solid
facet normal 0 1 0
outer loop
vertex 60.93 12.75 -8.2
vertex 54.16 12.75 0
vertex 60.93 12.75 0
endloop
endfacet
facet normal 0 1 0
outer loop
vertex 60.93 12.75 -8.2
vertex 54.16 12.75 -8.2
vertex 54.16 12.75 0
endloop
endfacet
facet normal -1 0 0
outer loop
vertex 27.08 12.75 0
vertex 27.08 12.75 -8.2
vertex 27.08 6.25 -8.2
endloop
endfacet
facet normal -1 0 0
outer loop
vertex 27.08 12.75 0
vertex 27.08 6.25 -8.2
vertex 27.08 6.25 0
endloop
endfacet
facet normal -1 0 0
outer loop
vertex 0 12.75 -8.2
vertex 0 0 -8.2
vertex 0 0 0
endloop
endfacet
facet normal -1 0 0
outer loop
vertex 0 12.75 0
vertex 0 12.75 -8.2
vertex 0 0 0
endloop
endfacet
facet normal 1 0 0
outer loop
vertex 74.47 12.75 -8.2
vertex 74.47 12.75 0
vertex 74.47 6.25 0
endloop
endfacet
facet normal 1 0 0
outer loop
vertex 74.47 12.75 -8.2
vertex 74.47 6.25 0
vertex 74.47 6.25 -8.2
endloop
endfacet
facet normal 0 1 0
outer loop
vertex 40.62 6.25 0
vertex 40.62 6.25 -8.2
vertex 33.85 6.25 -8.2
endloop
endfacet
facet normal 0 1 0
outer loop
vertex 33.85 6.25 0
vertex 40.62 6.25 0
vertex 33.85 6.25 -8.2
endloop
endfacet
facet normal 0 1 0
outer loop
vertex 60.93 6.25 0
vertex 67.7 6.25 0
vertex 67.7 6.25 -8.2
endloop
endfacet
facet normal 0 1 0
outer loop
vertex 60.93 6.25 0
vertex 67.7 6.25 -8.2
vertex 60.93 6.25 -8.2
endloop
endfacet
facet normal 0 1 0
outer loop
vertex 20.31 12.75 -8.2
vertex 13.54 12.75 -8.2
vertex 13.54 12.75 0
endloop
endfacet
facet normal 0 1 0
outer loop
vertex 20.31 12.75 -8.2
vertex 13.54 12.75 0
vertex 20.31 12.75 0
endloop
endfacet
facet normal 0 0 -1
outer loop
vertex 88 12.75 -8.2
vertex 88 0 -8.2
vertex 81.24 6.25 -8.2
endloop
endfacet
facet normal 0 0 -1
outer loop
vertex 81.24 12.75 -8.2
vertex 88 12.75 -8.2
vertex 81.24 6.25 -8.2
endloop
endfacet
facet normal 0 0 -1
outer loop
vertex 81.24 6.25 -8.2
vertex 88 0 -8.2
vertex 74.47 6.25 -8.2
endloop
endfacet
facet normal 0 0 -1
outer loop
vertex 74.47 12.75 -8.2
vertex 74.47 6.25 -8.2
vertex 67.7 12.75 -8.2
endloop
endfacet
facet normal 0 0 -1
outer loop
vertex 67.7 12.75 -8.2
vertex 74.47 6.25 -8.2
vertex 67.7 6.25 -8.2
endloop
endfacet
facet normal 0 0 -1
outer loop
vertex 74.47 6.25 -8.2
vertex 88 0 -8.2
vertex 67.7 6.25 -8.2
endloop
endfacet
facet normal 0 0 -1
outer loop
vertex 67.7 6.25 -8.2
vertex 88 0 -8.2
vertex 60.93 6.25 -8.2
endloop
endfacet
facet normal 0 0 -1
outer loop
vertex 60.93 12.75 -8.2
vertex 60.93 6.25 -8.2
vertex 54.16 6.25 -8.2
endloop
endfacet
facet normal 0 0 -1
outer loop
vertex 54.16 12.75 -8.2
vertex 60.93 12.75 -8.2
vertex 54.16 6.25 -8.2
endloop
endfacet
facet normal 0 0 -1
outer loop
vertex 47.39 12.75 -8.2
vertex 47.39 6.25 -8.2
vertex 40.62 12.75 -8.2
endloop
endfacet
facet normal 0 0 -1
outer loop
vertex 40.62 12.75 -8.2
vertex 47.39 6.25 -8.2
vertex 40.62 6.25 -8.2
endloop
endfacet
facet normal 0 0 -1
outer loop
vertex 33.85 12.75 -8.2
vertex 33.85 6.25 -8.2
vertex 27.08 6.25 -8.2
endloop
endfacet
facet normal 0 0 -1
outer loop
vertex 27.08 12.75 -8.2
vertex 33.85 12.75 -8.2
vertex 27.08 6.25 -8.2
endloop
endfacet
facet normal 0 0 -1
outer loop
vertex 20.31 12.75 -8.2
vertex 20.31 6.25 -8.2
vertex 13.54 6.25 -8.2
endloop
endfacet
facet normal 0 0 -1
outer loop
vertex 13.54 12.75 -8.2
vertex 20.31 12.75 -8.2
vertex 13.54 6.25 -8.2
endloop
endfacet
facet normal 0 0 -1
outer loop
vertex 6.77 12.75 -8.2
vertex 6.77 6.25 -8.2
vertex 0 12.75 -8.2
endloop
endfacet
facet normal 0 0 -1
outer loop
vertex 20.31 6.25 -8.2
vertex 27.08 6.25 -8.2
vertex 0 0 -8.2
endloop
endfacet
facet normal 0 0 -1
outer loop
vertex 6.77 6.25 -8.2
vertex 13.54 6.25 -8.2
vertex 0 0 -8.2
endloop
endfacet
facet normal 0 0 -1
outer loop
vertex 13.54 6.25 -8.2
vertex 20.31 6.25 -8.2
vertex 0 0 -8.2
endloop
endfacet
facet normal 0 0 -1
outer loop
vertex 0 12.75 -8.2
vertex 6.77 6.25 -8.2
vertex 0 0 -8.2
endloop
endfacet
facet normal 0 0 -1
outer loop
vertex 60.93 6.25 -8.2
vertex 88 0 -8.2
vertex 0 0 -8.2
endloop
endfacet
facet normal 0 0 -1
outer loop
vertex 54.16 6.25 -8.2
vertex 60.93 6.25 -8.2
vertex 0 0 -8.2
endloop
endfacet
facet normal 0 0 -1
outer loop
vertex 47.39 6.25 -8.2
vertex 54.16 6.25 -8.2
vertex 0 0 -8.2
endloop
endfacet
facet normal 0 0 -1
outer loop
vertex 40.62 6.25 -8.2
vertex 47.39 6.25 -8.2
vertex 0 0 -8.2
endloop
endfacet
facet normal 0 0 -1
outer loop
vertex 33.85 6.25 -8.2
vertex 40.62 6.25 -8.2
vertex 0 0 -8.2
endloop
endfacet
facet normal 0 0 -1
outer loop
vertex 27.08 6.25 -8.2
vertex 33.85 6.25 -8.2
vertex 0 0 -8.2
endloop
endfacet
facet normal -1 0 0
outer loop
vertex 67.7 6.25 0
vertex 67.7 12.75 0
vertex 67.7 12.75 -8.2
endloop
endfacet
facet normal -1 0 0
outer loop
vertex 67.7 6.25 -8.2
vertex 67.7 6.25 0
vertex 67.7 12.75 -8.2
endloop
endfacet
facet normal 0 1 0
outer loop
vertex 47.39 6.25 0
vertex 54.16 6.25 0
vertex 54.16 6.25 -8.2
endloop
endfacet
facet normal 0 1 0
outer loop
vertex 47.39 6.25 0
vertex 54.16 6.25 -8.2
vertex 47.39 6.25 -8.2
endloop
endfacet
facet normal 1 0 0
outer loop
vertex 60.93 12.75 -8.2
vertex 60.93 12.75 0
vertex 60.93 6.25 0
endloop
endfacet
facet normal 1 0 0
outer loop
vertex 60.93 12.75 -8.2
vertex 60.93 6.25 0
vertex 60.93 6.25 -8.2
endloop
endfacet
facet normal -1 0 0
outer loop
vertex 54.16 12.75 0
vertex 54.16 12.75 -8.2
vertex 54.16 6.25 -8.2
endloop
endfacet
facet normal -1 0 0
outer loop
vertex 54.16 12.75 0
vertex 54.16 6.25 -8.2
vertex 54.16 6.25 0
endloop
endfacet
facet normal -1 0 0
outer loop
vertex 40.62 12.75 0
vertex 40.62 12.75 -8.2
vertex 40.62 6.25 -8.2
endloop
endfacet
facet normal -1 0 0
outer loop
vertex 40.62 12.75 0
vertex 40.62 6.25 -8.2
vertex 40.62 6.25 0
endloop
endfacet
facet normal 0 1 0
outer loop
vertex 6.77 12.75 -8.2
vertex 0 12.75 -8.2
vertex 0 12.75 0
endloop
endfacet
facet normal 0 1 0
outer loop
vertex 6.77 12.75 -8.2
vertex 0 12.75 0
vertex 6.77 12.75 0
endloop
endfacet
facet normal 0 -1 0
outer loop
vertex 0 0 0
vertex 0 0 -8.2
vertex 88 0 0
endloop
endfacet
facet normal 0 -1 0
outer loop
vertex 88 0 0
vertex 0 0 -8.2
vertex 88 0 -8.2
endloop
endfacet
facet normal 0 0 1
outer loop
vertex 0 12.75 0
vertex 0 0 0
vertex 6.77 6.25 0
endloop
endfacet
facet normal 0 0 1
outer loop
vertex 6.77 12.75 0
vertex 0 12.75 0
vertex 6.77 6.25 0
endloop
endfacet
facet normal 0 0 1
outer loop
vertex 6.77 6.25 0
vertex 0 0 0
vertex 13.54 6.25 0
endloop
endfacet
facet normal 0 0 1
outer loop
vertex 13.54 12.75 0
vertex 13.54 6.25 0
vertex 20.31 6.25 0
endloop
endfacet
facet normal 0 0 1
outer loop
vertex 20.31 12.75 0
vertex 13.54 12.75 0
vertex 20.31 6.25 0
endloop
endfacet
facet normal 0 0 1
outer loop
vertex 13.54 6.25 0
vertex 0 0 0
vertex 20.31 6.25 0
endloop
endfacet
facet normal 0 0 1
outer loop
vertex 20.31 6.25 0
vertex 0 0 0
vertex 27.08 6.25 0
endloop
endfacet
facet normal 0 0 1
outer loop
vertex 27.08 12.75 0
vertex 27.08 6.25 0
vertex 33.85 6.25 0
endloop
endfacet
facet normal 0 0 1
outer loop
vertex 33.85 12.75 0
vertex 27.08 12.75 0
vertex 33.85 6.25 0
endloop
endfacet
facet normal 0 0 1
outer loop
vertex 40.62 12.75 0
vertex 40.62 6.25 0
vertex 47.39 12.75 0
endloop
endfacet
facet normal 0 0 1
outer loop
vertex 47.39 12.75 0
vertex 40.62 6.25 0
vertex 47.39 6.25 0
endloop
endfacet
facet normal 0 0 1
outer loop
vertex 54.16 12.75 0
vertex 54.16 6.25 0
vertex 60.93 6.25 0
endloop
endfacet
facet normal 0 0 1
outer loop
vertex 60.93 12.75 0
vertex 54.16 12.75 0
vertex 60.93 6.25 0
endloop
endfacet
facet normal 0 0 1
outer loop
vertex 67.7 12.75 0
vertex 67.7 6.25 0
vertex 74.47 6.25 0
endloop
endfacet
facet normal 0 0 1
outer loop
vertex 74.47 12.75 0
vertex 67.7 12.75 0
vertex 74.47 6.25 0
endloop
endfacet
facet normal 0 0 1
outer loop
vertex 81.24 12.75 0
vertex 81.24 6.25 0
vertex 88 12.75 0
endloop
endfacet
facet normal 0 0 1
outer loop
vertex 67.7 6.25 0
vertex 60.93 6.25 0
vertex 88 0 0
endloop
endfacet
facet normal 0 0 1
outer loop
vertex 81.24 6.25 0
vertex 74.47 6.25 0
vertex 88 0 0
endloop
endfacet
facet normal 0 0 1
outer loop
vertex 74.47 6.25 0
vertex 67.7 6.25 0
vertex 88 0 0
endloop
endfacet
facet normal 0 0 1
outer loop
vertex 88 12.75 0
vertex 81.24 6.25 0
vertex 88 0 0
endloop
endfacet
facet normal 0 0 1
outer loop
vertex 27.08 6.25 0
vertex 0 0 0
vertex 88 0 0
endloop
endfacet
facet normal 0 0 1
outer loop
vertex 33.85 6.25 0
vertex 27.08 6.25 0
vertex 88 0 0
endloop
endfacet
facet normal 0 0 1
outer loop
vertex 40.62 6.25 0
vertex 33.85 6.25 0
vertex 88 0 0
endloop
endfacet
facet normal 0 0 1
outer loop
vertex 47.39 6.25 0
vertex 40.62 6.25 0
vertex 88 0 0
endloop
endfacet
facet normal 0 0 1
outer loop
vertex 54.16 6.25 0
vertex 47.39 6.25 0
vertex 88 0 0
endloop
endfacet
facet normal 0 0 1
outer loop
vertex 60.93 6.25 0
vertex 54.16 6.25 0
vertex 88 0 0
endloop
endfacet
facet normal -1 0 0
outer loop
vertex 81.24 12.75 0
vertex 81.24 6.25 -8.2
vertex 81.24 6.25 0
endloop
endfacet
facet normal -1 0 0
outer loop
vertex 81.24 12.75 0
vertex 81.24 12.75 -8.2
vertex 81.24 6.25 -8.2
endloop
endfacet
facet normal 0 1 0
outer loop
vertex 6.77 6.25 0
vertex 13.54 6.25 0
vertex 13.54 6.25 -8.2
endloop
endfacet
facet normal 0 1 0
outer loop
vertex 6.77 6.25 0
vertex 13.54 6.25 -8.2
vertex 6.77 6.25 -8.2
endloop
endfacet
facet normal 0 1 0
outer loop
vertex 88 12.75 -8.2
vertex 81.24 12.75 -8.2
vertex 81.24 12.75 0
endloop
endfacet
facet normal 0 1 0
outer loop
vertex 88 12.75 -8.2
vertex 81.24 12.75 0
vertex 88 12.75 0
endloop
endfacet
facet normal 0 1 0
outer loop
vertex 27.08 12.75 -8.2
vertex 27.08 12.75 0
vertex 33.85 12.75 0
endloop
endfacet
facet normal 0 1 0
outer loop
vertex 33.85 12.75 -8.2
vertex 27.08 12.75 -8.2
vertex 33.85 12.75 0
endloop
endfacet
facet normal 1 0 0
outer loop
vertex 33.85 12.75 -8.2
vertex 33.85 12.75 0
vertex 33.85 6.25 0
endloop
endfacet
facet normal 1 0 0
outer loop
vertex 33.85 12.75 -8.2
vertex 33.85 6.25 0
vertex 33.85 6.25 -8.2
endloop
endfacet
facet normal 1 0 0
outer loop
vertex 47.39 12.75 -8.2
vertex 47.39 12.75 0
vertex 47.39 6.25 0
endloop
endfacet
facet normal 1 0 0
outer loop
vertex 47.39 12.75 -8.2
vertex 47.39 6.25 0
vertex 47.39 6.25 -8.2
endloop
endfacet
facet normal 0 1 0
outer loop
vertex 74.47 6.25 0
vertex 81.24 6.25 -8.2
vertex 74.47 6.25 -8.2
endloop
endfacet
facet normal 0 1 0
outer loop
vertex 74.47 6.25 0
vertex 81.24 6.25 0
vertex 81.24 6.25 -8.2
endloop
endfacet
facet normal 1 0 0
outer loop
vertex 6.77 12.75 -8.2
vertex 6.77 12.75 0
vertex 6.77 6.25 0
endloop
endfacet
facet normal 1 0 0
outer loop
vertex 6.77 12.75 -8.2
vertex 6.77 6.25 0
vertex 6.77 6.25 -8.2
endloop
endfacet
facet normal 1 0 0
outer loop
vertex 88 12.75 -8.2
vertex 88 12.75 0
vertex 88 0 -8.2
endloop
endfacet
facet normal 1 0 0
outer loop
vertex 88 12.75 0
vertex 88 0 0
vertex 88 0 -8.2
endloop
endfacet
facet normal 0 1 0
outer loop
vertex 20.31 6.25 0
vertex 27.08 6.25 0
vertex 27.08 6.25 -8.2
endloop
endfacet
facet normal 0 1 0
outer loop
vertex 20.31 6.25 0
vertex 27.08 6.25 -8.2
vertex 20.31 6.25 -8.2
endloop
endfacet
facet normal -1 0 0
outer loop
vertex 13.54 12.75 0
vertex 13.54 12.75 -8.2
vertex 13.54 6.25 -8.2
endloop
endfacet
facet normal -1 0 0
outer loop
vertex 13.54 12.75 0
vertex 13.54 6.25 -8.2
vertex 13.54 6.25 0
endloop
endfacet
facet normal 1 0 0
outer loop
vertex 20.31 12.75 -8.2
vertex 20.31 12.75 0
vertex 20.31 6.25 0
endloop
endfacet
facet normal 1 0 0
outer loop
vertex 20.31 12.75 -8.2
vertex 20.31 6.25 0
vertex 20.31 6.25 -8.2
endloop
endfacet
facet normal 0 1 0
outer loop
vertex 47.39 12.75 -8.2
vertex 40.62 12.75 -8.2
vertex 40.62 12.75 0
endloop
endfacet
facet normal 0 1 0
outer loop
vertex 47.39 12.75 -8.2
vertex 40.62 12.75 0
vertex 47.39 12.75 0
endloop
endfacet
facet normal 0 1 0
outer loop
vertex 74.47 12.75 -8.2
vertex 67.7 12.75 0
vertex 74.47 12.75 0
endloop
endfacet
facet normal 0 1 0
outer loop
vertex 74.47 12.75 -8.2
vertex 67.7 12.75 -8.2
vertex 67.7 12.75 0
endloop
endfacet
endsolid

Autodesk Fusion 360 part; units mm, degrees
sketch "Sketch1" plane through (0, 0, 0) normal (0, 1, 0) x (1, 0, 0)
  line L0 (0, 0) -> (88, 0)
  line L1 (88, 0) -> (88, 8.2)
  line L2 (88, 8.2) -> (0, 8.2)
  line L3 (0, 8.2) -> (0, 0)
  dimension "d1" = 88
  dimension "d2" = 8.2
extrude "Extrude1" add sketch "Sketch1" along normal blind 12.75
sketch "Sketch2" plane through (0, 12.75, 0) normal (0, 1, 0) x (-1, 0, 0)
  line L0 (0, -8.2) -> (0, 0)
  line L1 (0, 0) -> (-88, 0)
  line L2 (-88, 0) -> (-88, -8.2)
  line L3 (-88, -8.2) -> (0, -8.2)
  line L4 (0, 0) -> (-6.77, 0)
  line L5 (-6.77, 0) -> (-6.77, -8.2)
  line L6 (-6.77, -8.2) -> (0, -8.2)
  line L7 (0, -8.2) -> (0, 0)
  line L8 (-6.77, -8.2) -> (-13.54, -8.2)
  line L9 (-13.54, -8.2) -> (-13.54, 0)
  line L10 (-13.54, 0) -> (-6.77, 0)
  line L11 (-6.77, 0) -> (-6.77, -8.2)
  dimension "d5" = 6.77
  dimension "d6" = 6.77
extrude "Extrude2" cut sketch "Sketch2" against normal blind 6.5 contours L1 L3 L5 L8 L9 L10 L11
sketch "Sketch3" plane through (0, 12.75, 0) normal (0, 1, 0) x (-1, 0, 0)
  line L0 (-13.54, -8.2) -> (-13.54, 0)
  line L1 (-13.54, 0) -> (-88, 0)
  line L2 (-88, 0) -> (-88, -8.2)
  line L3 (-88, -8.2) -> (-13.54, -8.2)
  line L4 (-13.54, 0) -> (-20.31, 0)
  line L5 (-20.31, 0) -> (-20.31, -8.2)
  line L6 (-20.31, -8.2) -> (-13.54, -8.2)
  line L7 (-13.54, -8.2) -> (-13.54, 0)
  line L8 (-20.31, -8.2) -> (-27.08, -8.2)
  line L9 (-27.08, -8.2) -> (-27.08, 0)
  line L10 (-27.08, 0) -> (-20.31, 0)
  line L11 (-20.31, 0) -> (-20.31, -8.2)
  dimension "d9" = 6.77
  dimension "d10" = 6.77
extrude "Extrude3" cut sketch "Sketch3" against normal blind 6.5 contours L1 L3 L5 L8 L9 L10 L11
sketch "Sketch4" plane through (0, 12.75, 0) normal (0, 1, 0) x (-1, 0, 0)
  line L0 (-27.08, -8.2) -> (-27.08, 0)
  line L1 (-27.08, 0) -> (-88, 0)
  line L2 (-88, 0) -> (-88, -8.2)
  line L3 (-88, -8.2) -> (-27.08, -8.2)
  line L4 (-27.08, 0) -> (-33.85, 0)
  line L5 (-33.85, 0) -> (-33.85, -8.2)
  line L6 (-33.85, -8.2) -> (-27.08, -8.2)
  line L7 (-27.08, -8.2) -> (-27.08, 0)
  line L8 (-33.85, -8.2) -> (-40.62, -8.2)
  line L9 (-40.62, -8.2) -> (-40.62, 0)
  line L10 (-40.62, 0) -> (-33.85, 0)
  line L11 (-33.85, 0) -> (-33.85, -8.2)
  dimension "d13" = 6.77
  dimension "d14" = 6.77
extrude "Extrude4" cut sketch "Sketch4" against normal blind 6.5 contours L1 L3 L5 L8 L9 L10 L11
sketch "Sketch5" plane through (0, 12.75, 0) normal (0, 1, 0) x (-1, 0, 0)
  line L0 (-40.62, -8.2) -> (-40.62, 0)
  line L1 (-40.62, 0) -> (-88, 0)
  line L2 (-88, 0) -> (-88, -8.2)
  line L3 (-88, -8.2) -> (-40.62, -8.2)
  line L4 (-40.62, 0) -> (-47.39, 0)
  line L5 (-47.39, 0) -> (-47.39, -8.2)
  line L6 (-47.39, -8.2) -> (-40.62, -8.2)
  line L7 (-40.62, -8.2) -> (-40.62, 0)
  line L8 (-47.39, -8.2) -> (-54.16, -8.2)
  line L9 (-54.16, -8.2) -> (-54.16, 0)
  line L10 (-54.16, 0) -> (-47.39, 0)
  line L11 (-47.39, 0) -> (-47.39, -8.2)
  dimension "d17" = 6.77
  dimension "d18" = 6.77
extrude "Extrude5" cut sketch "Sketch5" against normal blind 6.5 contours L1 L3 L5 L8 L9 L10 L11
sketch "Sketch6" plane through (0, 12.75, 0) normal (0, 1, 0) x (-1, 0, 0)
  line L0 (-54.16, -8.2) -> (-54.16, 0)
  line L1 (-54.16, 0) -> (-88, 0)
  line L2 (-88, 0) -> (-88, -8.2)
  line L3 (-88, -8.2) -> (-54.16, -8.2)
  line L4 (-54.16, 0) -> (-60.93, 0)
  line L5 (-60.93, 0) -> (-60.93, -8.2)
  line L6 (-60.93, -8.2) -> (-54.16, -8.2)
  line L7 (-54.16, -8.2) -> (-54.16, 0)
  line L8 (-60.93, 0) -> (-67.7, 0)
  line L9 (-67.7, 0) -> (-67.7, -8.2)
  line L10 (-67.7, -8.2) -> (-60.93, -8.2)
  line L11 (-60.93, -8.2) -> (-60.93, 0)
  dimension "d21" = 6.77
  dimension "d22" = 6.77
extrude "Extrude6" cut sketch "Sketch6" against normal blind 6.5 contours L1 L3 L5 L8 L9 L10 L11
sketch "Sketch7" plane through (0, 12.75, 0) normal (0, 1, 0) x (-1, 0, 0)
  line L0 (-67.7, -8.2) -> (-67.7, 0)
  line L1 (-67.7, 0) -> (-88, 0)
  line L2 (-88, 0) -> (-88, -8.2)
  line L3 (-88, -8.2) -> (-67.7, -8.2)
  line L4 (-67.7, 0) -> (-74.47, 0)
  line L5 (-74.47, 0) -> (-74.47, -8.2)
  line L6 (-74.47, -8.2) -> (-67.7, -8.2)
  line L7 (-67.7, -8.2) -> (-67.7, 0)
  line L8 (-74.47, -8.2) -> (-81.24, -8.2)
  line L9 (-81.24, -8.2) -> (-81.24, 0)
  line L10 (-81.24, 0) -> (-74.47, 0)
  line L11 (-74.47, 0) -> (-74.47, -8.2)
  dimension "d25" = 6.77
  dimension "d26" = 6.77
extrude "Extrude7" cut sketch "Sketch7" against normal blind 6.5 contours L1 L3 L5 L8 L9 L10 L11
